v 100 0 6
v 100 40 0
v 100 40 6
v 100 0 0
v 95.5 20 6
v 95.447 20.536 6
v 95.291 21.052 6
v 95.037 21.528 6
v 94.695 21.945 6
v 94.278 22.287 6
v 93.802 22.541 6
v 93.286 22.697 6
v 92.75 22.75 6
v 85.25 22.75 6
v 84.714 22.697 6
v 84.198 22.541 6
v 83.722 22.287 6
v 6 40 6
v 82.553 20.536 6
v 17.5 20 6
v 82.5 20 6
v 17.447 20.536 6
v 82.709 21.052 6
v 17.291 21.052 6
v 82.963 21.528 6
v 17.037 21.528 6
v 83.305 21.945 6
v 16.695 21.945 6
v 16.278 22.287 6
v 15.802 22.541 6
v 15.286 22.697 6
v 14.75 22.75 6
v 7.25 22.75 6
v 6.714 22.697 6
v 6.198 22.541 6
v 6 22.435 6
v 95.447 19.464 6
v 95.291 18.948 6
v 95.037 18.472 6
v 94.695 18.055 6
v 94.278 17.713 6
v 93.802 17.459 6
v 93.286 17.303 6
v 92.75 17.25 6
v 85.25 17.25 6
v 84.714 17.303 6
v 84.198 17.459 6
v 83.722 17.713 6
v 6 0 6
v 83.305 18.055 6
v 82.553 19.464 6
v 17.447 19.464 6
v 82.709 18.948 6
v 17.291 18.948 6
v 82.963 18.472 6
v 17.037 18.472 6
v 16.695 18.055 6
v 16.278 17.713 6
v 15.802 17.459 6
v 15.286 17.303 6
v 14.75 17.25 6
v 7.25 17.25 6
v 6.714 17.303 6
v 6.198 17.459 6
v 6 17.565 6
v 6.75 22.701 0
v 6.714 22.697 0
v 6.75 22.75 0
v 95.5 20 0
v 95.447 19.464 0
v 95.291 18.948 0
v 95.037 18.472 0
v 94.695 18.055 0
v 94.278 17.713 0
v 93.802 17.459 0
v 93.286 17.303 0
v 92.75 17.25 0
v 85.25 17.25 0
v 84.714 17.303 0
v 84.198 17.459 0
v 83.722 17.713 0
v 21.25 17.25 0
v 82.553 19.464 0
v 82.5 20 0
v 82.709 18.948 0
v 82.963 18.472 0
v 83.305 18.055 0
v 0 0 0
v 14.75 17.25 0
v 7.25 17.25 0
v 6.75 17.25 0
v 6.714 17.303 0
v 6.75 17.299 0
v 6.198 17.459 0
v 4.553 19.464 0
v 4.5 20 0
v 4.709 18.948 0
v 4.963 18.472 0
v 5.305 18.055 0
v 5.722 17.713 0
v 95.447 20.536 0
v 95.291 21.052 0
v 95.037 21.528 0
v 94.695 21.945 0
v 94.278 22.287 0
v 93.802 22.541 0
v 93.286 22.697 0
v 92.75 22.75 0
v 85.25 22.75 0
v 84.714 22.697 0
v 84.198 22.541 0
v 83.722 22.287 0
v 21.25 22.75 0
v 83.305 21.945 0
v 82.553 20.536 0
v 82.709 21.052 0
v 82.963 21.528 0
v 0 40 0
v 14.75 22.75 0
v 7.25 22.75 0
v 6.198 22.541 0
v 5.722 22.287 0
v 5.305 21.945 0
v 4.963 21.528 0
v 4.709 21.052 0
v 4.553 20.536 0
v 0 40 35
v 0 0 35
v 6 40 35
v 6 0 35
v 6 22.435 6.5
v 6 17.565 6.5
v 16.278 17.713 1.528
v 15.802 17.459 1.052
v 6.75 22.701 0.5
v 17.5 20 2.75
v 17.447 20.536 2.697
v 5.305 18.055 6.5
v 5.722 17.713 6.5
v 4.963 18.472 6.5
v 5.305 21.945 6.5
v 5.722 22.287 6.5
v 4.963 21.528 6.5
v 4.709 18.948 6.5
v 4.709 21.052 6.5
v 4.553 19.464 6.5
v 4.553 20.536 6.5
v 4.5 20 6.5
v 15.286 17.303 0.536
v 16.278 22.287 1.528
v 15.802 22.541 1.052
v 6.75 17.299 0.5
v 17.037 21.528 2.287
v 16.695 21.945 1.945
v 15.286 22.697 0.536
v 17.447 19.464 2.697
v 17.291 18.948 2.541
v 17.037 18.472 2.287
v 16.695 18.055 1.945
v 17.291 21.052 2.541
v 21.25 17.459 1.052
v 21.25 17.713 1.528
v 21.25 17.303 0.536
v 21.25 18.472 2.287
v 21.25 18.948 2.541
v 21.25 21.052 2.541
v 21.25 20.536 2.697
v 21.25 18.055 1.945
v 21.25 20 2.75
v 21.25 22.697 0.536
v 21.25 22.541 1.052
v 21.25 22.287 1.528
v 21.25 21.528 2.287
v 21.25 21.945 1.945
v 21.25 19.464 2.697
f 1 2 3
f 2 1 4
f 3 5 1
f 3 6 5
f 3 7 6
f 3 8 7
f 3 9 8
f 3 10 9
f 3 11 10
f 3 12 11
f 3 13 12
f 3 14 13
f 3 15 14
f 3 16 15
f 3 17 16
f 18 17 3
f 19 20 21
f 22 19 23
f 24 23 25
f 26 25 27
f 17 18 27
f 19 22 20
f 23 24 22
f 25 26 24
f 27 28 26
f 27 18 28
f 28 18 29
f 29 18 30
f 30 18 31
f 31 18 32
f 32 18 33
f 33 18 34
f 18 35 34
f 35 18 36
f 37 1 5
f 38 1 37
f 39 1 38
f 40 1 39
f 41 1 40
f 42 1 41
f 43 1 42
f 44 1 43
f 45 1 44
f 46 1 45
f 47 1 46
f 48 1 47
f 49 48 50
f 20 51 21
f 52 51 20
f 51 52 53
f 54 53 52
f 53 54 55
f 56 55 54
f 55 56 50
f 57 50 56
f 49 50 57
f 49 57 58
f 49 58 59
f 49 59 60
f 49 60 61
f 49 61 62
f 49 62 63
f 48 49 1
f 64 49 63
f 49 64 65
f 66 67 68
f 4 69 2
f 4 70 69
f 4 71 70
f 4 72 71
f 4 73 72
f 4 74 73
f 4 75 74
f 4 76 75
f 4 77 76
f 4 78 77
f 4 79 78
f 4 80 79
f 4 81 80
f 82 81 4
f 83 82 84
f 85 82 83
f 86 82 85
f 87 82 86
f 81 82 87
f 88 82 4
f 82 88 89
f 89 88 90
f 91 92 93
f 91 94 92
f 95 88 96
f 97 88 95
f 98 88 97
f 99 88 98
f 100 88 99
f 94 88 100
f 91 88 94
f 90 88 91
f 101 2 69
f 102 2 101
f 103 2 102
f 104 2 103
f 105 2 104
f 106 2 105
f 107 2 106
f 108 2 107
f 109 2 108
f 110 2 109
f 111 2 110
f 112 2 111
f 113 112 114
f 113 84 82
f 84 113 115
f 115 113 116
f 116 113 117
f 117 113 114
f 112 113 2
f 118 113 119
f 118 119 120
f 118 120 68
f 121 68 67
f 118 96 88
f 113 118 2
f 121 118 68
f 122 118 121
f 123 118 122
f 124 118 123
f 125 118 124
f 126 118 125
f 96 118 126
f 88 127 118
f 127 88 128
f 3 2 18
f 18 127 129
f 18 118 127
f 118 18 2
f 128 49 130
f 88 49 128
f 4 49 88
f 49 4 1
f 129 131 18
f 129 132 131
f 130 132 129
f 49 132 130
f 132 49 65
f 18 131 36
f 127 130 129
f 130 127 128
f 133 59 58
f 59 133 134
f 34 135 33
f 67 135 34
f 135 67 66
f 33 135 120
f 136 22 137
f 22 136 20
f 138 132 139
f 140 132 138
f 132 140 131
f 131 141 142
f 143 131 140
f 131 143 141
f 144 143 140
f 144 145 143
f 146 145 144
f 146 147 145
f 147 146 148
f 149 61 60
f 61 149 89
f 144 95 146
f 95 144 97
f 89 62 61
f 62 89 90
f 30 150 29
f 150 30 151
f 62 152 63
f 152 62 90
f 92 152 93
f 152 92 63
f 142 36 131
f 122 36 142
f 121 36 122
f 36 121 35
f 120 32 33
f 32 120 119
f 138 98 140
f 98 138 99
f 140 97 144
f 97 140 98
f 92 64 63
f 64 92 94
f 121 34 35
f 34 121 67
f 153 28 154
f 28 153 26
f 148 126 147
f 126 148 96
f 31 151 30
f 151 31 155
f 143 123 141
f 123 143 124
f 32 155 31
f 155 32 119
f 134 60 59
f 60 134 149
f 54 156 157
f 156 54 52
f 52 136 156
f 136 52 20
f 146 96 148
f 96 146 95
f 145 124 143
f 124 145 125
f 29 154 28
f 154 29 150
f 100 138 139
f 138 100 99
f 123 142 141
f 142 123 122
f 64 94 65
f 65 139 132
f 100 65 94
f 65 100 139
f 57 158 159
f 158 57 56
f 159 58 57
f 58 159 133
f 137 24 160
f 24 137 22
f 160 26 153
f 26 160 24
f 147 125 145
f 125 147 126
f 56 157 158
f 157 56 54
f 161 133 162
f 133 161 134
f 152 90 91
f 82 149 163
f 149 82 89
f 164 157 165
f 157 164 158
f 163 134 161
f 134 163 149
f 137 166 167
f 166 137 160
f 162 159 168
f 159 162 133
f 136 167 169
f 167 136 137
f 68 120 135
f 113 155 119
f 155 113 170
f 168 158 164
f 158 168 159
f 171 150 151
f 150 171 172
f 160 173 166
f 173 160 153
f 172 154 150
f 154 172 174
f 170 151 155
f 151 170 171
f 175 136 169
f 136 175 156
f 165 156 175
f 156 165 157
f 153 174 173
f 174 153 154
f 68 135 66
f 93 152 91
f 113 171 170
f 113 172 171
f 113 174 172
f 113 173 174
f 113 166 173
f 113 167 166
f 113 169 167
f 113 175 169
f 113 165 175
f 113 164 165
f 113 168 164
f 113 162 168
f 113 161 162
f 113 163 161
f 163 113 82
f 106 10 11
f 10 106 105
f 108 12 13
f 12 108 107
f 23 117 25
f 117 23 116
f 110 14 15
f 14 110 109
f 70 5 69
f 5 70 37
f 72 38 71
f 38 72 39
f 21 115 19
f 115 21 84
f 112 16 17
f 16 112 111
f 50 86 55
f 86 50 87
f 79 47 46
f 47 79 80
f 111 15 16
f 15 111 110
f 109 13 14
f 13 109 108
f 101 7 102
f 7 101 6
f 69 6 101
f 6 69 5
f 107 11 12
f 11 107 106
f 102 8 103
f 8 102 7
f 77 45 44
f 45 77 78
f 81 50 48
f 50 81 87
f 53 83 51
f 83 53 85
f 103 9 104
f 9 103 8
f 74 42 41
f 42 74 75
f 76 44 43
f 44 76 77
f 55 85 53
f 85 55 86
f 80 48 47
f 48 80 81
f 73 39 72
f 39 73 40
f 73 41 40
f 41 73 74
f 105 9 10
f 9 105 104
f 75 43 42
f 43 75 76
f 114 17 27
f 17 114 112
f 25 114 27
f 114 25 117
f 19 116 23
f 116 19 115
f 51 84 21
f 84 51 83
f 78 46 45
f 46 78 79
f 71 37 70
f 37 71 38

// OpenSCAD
$fn = 32;

// ----------------------------------------------------------------------
// L-bracket: 100 x 40 x 35 mm
// ----------------------------------------------------------------------

// --- parameters (mm) ---
leg_a = 100;              // horizontal leg, X
leg_b = 35;               // vertical leg, Z
depth = 40;               // bracket depth, Y
thick = 6;                // plate thickness
hole_d = 5.5;             // clearance for M5
slot_w = 5.5;             // euro screw slot width
slot_l = 13;              // euro screw slot length

module hole_z(px, py) {
  translate([px, py, -0.5]) cylinder(h = thick + 1, d = hole_d);
}
module hole_x(pz, py) {
  translate([-0.5, py, pz]) rotate([0, 90, 0]) cylinder(h = thick + 1, d = hole_d);
}
module euro_slot_z(px, py) {
  hull() {
    translate([px - (slot_l - slot_w) / 2, py, -0.5]) cylinder(h = thick + 1, d = slot_w);
    translate([px + (slot_l - slot_w) / 2, py, -0.5]) cylinder(h = thick + 1, d = slot_w);
  }
}
module euro_slot_x(pz, py) {
  translate([-0.5, 0, 0]) rotate([0, 90, 0]) hull() {
    translate([0, py, pz - (slot_l - slot_w) / 2]) cylinder(h = thick + 1, d = slot_w);
    translate([0, py, pz + (slot_l - slot_w) / 2]) cylinder(h = thick + 1, d = slot_w);
  }
}

difference() {
  union() {
    /* horizontal leg */
    cube([leg_a, depth, thick]);
    /* vertical leg, overlapping the corner block */
    cube([thick, depth, leg_b]);
  }
  euro_slot_z(11, 20);
  euro_slot_x(11, 20);
  euro_slot_z(89, 20);
}
